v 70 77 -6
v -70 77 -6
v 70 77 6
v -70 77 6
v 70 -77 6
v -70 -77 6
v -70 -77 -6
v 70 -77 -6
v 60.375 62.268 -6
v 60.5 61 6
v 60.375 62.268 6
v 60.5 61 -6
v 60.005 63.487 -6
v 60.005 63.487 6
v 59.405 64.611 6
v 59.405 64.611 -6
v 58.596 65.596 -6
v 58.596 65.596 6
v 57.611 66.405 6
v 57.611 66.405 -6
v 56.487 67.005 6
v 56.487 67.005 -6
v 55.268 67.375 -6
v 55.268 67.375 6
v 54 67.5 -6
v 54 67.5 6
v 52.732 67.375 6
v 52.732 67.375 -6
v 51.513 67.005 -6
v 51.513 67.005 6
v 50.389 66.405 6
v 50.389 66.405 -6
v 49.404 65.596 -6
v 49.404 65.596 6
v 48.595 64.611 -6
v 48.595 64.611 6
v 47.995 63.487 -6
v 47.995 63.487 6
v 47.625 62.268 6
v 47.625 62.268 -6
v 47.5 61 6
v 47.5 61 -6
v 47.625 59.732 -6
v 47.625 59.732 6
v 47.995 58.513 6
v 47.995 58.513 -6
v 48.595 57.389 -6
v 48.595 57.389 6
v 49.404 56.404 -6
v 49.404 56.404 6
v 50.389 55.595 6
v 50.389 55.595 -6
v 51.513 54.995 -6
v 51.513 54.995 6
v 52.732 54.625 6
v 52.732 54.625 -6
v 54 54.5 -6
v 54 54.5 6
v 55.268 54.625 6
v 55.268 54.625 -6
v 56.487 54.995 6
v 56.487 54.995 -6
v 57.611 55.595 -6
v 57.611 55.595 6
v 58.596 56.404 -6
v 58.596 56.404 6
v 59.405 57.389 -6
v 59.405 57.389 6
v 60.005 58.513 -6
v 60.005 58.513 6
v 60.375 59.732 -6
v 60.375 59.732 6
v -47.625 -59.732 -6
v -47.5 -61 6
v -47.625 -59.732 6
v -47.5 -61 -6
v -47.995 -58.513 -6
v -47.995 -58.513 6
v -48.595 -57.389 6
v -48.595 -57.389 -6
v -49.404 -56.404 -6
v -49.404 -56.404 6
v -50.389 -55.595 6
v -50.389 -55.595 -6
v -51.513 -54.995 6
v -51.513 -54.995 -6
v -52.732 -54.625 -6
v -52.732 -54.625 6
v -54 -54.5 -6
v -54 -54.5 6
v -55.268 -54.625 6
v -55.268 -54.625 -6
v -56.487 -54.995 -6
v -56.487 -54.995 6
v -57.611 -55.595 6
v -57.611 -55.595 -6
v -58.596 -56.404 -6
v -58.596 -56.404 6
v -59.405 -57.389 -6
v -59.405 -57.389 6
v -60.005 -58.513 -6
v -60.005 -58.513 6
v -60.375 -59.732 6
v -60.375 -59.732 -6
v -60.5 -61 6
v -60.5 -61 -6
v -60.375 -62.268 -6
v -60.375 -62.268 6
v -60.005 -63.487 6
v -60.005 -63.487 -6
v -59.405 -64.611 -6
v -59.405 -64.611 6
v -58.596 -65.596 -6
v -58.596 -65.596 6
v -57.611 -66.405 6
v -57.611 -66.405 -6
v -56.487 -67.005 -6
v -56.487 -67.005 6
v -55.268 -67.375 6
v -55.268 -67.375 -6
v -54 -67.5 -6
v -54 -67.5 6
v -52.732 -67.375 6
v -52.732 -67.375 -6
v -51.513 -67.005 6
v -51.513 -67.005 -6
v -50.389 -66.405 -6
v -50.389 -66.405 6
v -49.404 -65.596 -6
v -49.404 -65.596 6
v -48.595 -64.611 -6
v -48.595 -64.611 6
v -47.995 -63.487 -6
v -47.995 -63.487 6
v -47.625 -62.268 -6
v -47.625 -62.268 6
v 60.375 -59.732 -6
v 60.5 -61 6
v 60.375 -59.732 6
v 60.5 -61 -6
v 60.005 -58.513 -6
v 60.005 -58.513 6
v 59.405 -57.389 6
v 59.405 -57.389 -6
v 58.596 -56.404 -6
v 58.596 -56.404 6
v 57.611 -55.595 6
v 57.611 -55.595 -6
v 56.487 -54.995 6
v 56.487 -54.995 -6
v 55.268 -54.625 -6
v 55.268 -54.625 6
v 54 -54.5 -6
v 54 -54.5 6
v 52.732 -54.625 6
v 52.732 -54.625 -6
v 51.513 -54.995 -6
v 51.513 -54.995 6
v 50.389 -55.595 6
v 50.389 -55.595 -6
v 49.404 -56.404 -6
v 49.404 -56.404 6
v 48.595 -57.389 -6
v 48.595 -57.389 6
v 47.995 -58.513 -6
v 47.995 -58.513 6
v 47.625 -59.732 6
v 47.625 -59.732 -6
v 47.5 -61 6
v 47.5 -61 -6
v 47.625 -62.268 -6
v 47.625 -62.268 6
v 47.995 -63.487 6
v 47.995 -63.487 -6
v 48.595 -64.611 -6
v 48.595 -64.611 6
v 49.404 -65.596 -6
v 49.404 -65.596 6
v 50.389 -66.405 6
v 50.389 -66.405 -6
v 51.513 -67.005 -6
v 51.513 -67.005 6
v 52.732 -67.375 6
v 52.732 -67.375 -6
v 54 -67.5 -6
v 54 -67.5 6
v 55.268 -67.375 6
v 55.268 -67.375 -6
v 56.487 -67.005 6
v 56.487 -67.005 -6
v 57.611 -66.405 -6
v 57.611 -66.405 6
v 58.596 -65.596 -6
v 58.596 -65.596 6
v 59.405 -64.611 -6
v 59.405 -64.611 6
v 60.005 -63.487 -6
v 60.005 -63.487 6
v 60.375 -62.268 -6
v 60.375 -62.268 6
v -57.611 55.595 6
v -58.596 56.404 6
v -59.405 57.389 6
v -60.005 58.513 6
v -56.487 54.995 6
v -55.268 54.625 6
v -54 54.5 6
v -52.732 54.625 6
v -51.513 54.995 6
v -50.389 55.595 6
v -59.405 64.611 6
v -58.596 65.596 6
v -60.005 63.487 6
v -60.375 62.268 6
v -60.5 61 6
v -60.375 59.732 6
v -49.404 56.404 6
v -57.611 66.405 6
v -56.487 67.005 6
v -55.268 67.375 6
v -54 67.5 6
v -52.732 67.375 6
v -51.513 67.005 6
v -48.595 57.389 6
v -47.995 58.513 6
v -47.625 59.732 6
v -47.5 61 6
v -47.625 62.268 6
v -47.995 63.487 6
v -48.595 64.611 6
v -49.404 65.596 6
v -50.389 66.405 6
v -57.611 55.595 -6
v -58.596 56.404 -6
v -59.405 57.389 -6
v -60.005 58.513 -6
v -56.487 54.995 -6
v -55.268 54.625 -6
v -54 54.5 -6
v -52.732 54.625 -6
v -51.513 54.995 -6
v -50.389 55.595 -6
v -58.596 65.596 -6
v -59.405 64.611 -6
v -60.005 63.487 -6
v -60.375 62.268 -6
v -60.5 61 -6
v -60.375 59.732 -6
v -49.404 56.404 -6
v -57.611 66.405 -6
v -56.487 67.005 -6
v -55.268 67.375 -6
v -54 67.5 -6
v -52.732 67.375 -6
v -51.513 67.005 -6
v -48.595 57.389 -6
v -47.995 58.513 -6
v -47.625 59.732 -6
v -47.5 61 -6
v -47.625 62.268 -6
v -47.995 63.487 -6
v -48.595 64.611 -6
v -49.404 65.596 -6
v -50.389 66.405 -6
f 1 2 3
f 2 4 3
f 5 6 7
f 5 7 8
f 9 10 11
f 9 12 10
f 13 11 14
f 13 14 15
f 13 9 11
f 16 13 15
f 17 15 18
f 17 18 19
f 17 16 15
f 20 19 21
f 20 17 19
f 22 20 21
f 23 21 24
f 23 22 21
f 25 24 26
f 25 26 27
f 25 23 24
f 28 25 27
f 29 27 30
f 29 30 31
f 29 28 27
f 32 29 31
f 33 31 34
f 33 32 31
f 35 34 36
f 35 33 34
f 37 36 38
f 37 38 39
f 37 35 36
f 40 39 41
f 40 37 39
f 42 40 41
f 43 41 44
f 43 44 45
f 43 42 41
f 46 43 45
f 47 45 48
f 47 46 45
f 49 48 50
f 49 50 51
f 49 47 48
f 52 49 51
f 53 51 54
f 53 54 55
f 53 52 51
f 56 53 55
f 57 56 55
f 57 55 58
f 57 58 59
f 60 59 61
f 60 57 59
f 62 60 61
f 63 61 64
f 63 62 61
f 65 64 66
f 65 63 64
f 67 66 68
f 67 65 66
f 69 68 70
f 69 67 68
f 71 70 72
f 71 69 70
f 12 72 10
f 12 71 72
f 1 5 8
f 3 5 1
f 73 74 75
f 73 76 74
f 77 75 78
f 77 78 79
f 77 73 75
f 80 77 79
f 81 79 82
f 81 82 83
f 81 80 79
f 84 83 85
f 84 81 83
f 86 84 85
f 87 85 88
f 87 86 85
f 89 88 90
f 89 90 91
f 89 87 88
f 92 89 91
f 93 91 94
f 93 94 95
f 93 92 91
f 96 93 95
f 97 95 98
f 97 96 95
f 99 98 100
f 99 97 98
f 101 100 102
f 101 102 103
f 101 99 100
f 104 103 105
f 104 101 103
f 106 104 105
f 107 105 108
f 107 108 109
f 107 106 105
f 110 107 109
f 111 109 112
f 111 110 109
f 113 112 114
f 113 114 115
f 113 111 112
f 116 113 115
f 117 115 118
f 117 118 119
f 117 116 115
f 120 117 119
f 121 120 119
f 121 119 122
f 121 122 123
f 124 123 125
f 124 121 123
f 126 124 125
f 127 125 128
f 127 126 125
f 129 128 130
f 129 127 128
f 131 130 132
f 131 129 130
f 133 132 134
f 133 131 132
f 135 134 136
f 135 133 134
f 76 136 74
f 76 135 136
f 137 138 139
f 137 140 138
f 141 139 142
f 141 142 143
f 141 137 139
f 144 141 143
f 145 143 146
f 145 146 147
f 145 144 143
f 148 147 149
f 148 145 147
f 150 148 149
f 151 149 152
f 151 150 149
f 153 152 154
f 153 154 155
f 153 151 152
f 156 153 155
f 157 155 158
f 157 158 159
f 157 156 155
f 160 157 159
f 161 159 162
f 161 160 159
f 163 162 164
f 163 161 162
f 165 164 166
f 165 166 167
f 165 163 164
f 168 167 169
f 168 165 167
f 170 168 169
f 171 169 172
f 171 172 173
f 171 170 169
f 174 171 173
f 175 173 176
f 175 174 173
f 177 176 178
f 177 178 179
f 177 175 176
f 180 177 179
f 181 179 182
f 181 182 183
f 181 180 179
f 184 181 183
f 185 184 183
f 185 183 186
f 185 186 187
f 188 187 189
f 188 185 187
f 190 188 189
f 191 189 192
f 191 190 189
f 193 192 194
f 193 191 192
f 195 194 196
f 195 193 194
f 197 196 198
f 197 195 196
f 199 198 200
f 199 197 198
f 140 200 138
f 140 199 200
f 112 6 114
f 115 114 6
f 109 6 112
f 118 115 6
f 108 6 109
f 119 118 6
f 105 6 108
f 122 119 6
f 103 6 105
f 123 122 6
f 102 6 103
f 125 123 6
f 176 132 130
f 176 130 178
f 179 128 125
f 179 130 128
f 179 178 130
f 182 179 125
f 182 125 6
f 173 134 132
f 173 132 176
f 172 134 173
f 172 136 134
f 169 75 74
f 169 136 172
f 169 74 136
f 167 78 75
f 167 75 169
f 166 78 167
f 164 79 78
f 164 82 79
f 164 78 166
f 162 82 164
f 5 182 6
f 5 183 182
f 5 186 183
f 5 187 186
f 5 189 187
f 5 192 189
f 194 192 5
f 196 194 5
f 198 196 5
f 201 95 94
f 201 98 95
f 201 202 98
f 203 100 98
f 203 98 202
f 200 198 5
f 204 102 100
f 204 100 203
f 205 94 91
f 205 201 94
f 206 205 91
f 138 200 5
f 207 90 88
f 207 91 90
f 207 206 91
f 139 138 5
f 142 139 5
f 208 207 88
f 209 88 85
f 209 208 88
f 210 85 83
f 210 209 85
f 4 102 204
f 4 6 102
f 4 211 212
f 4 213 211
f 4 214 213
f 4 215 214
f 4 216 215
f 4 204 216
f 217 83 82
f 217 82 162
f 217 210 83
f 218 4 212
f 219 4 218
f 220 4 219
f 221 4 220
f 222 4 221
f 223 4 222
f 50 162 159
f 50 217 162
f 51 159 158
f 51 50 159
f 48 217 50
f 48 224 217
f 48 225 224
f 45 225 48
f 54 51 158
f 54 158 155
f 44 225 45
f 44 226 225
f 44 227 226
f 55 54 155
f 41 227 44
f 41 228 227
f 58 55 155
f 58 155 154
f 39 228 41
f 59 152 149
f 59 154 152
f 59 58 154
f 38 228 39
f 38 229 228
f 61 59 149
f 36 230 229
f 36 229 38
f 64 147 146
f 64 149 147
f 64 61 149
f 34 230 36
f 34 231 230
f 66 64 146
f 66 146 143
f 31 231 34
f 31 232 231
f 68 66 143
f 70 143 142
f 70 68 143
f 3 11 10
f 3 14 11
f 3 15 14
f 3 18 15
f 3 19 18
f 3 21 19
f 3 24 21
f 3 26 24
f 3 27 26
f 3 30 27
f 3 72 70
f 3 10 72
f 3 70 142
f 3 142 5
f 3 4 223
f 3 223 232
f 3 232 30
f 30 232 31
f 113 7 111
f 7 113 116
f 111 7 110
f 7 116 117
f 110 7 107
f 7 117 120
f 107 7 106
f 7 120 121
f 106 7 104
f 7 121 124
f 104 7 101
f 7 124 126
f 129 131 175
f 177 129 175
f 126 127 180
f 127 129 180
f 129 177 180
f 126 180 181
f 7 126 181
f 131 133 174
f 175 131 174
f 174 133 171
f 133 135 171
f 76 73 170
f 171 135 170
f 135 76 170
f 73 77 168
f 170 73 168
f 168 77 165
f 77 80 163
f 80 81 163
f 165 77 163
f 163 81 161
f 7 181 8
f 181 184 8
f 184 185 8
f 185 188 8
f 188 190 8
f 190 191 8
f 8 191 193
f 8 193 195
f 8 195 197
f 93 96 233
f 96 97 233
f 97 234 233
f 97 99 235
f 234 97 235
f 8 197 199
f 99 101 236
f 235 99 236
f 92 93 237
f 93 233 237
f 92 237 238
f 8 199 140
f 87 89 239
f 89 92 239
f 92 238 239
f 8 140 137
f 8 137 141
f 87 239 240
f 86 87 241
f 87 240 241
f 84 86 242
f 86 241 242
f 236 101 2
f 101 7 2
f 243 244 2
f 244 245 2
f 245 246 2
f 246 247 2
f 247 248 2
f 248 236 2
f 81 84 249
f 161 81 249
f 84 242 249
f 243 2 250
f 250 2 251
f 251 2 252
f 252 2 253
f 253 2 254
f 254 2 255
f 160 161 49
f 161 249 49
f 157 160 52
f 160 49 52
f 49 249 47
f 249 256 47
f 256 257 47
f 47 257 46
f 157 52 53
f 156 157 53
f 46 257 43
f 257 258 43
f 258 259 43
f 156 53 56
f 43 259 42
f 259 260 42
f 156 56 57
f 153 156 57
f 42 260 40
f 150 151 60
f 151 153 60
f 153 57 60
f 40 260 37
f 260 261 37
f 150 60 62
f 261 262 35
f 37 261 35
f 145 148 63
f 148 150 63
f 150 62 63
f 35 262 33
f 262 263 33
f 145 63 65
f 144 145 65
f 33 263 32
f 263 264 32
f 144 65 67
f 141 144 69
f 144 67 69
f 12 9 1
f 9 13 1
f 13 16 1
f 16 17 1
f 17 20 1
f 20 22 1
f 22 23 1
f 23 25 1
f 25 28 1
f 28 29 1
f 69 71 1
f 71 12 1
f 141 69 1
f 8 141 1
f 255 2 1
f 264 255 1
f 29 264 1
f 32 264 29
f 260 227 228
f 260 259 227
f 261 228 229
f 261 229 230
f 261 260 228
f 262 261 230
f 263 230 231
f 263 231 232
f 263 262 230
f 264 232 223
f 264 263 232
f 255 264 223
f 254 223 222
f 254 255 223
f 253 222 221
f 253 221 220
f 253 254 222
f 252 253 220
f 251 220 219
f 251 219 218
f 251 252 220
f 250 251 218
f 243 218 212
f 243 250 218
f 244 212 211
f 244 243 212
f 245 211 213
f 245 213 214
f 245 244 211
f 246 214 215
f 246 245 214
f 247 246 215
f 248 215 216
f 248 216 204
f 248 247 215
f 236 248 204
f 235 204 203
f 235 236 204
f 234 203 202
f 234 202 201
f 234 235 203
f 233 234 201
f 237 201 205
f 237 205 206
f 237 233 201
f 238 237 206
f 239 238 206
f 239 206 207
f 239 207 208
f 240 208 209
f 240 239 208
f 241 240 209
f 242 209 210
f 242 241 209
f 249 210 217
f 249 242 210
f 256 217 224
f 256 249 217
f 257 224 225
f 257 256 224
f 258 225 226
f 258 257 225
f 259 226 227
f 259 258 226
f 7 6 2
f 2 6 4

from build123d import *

# Parameters (mm, degrees)
SKETCH1_W           = 140
SKETCH1_H           = 154
SKETCH1_R           = 6.5
BOSS_EXTRUDE1_DEPTH = 6


with BuildPart() as part:
    # Sketch1 → Boss-Extrude1 (new body, symmetric)
    with BuildSketch(Plane.XY):
        Rectangle(SKETCH1_W, SKETCH1_H)
        with Locations((-54, 61)):
            Circle(SKETCH1_R, mode=Mode.SUBTRACT)
        with Locations((54, 61)):
            Circle(SKETCH1_R, mode=Mode.SUBTRACT)
        with Locations((-54, -61)):
            Circle(SKETCH1_R, mode=Mode.SUBTRACT)
        with Locations((54, -61)):
            Circle(SKETCH1_R, mode=Mode.SUBTRACT)
    extrude(amount=BOSS_EXTRUDE1_DEPTH, both=True)


solid = part.part
